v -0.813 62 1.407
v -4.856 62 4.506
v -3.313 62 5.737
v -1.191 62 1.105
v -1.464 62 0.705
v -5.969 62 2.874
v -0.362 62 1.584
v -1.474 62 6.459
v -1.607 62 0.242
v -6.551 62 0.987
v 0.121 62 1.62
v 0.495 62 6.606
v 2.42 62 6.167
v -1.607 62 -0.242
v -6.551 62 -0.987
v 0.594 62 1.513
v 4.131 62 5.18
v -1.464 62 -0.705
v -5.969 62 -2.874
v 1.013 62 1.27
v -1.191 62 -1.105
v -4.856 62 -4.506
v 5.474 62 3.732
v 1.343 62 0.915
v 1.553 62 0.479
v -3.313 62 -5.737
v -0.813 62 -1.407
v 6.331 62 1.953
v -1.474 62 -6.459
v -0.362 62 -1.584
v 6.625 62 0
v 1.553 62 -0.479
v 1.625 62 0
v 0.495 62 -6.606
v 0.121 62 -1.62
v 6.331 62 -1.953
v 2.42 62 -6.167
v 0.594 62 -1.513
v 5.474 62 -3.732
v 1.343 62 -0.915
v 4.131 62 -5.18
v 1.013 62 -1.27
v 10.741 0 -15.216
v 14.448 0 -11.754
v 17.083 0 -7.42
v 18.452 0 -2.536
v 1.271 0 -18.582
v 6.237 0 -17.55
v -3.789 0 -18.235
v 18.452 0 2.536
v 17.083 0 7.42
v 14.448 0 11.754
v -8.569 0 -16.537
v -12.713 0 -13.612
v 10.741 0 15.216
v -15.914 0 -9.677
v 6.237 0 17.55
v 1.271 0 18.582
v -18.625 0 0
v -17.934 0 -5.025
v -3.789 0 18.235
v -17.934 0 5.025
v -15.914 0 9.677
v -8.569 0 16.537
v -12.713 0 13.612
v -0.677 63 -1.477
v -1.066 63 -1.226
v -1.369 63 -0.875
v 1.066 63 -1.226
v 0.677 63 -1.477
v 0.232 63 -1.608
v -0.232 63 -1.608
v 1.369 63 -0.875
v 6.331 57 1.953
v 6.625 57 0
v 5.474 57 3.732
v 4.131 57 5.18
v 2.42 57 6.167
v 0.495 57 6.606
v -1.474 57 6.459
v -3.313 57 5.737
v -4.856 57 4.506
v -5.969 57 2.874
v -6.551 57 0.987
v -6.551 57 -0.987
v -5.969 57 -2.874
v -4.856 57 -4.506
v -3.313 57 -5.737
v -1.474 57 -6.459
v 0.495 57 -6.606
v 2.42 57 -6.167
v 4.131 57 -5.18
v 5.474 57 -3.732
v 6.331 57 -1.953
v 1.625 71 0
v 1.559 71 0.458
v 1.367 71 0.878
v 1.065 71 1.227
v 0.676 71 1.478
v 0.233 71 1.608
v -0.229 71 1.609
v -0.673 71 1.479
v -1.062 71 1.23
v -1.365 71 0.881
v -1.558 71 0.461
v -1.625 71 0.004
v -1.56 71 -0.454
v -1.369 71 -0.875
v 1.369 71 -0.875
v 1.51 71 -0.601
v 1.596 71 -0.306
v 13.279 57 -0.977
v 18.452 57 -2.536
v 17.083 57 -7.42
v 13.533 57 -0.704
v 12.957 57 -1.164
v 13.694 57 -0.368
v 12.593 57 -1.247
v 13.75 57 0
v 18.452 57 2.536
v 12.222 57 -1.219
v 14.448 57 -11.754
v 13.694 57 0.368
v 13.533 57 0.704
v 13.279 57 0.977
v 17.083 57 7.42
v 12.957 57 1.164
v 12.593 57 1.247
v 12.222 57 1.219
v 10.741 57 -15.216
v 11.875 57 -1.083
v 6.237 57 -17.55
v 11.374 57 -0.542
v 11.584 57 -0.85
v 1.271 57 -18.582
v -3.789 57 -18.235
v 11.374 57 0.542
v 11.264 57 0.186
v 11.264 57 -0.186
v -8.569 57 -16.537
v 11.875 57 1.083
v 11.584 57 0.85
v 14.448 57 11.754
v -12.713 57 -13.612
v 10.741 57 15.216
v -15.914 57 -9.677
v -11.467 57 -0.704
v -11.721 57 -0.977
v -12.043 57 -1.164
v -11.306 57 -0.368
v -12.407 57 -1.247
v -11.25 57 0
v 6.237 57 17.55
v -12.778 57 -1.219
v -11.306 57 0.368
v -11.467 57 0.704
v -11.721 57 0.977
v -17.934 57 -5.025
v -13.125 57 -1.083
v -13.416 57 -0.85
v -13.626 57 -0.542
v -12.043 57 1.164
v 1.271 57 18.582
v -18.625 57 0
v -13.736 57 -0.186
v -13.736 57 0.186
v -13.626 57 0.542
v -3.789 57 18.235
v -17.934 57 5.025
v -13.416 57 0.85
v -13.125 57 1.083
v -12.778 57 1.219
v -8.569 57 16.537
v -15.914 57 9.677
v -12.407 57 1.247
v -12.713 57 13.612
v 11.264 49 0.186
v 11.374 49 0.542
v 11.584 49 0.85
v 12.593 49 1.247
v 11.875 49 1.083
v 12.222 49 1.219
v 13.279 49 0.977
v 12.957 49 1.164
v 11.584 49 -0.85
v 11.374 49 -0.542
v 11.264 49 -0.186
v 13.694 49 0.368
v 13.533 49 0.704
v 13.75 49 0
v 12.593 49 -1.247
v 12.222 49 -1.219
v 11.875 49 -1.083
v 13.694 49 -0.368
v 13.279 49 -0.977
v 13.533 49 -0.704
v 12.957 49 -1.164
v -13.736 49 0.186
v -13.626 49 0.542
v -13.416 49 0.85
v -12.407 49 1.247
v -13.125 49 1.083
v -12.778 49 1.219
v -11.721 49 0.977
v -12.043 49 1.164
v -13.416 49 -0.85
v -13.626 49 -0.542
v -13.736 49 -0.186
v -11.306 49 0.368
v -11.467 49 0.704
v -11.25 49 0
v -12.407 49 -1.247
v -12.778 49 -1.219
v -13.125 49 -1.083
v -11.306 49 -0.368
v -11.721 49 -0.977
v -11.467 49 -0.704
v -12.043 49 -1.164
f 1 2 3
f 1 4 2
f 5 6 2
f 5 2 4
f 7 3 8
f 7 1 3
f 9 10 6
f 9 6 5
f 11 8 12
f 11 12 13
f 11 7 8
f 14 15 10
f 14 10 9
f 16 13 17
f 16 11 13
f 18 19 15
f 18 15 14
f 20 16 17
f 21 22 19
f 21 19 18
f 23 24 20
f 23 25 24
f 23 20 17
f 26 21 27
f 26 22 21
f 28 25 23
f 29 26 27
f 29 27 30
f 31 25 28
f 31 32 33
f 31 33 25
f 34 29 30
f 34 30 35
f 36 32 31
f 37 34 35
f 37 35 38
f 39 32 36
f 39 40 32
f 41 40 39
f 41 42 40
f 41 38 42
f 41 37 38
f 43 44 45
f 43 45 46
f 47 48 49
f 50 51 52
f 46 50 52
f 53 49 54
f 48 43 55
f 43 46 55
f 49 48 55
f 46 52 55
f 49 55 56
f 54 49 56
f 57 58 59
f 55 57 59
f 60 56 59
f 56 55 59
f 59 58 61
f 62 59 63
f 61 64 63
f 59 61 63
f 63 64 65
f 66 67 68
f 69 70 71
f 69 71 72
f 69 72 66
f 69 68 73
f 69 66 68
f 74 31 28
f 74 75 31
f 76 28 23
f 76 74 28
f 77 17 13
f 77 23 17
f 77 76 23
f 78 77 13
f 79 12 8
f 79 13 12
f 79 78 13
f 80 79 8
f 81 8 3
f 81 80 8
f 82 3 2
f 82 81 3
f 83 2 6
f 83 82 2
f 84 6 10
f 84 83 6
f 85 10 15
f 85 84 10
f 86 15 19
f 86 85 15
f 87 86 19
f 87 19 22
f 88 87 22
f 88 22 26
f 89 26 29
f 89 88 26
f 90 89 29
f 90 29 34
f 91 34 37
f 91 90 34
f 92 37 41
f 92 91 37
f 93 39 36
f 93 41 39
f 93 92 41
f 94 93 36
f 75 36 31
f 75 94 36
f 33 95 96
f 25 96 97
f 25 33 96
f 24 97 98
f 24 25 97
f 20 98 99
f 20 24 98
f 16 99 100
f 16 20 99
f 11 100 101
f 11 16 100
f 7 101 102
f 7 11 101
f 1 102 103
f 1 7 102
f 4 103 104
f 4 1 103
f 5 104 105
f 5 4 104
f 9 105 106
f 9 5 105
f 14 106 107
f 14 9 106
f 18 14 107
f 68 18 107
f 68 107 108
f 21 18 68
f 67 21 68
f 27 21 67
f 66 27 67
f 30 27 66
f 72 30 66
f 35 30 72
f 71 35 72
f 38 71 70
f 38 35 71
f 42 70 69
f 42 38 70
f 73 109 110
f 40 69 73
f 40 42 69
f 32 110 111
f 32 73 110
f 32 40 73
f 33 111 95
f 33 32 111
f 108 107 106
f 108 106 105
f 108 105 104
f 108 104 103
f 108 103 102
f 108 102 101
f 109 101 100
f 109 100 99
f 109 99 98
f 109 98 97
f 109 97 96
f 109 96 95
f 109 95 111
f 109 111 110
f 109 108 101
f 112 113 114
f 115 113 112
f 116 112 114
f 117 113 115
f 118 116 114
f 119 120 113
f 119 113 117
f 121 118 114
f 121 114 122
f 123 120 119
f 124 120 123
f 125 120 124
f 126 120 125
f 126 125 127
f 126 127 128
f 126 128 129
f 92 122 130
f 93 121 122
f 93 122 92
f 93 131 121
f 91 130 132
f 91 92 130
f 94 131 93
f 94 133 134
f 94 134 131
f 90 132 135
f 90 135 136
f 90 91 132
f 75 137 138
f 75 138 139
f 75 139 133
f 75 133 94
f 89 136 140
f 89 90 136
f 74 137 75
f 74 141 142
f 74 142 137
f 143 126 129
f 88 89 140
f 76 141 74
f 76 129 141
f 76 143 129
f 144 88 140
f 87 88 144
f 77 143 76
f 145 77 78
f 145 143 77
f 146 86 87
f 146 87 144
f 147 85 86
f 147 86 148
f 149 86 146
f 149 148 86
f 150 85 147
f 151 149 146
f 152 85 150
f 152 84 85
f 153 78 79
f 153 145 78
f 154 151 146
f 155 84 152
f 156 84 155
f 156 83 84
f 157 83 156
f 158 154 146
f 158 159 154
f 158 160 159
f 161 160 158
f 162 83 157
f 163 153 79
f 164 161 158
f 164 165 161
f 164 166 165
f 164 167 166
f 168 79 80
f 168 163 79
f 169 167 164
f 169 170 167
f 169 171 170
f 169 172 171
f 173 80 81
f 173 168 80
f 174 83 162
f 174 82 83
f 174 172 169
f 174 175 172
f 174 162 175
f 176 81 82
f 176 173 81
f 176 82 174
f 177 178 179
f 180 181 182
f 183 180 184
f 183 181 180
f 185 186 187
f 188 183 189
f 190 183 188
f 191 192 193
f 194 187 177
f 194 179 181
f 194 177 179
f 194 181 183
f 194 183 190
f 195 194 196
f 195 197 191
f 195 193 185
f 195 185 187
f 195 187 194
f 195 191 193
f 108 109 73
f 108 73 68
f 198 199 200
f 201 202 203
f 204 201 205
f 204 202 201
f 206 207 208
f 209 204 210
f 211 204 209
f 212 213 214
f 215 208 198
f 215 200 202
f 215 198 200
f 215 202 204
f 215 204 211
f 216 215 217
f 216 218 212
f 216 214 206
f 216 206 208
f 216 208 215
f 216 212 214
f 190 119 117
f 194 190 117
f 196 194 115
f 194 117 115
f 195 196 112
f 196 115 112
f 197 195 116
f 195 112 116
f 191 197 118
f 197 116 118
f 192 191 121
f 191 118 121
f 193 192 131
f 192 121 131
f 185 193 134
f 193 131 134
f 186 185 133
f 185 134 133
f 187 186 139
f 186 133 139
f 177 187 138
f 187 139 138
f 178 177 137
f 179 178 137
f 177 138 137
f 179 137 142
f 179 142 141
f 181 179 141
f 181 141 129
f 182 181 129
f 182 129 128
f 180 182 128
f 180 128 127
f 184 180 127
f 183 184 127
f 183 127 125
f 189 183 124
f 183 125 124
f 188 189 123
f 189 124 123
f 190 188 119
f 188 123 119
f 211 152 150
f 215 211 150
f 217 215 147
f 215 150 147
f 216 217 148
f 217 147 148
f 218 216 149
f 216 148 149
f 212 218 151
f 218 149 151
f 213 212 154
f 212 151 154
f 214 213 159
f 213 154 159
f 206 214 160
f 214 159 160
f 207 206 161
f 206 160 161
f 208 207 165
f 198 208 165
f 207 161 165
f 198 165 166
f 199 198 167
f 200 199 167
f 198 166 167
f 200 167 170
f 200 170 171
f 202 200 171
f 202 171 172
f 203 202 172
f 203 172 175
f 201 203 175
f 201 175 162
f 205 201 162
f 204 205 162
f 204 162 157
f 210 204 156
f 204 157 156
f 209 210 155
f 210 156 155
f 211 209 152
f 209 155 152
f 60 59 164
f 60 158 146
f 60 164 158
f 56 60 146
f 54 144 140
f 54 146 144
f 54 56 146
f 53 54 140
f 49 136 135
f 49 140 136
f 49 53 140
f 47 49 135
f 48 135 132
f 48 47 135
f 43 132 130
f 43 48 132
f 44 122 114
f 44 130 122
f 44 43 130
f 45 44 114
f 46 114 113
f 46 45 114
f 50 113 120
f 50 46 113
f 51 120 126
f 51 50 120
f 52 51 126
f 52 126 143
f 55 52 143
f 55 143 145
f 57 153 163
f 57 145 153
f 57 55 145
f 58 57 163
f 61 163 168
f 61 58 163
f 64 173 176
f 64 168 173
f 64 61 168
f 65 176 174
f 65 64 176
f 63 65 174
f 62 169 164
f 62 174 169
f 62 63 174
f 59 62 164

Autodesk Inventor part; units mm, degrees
ref_plane "YZ Plane" through (0, 0, 0) normal (1, 0, 0) x (0, 1, 0)
ref_plane "XZ Plane" through (0, 0, 0) normal (0, 1, 0) x (-1, 0, 0)
ref_plane "XY Plane" through (0, 0, 0) normal (0, 0, 1) x (1, 0, 0)
sketch "Sketch1" plane through (0, 0, 0) normal (0, 1, 0) x (-1, 0, 0)
  circle A0 centre (0, 0) radius 18.625
  dimension "d0" = 37.25
extrude "Extrusion1" add sketch "Sketch1" along normal blind 57
sketch "Sketch2" plane through (0, 57, 0) normal (0, 1, 0) x (1, 0, 0)
  circle A0 centre (0, 0) radius 6.625
  dimension "d3" = 13.25
extrude "Extrusion2" add sketch "Sketch2" along normal blind 5
sketch "Sketch3" plane through (0, 62, 0) normal (0, 1, 0) x (1, 0, 0)
  circle A0 centre (0, 0) radius 1.625
  dimension "d6" = 3.25
extrude "Extrusion3" add sketch "Sketch3" along normal blind 9
sketch "Sketch4" plane through (0, 71, 0) normal (0, 1, 0) x (1, 0, 0)
  circle A0 centre (0, 0) radius 1.625 projected
  line L0 (0, 0.875) -> (-1.3693, 0.875)
  line L1 (0, 0.875) -> (1.3693, 0.875)
  arc A1 (1.3693, 0.875) -> (-1.3693, 0.875) centre (0, 0) ccw
extrude "Extrusion4" cut sketch "Sketch4" against normal blind 8 contours L1 L0 A0 picked at (0.8372, 0.9686)
sketch "Sketch5" plane through (0, 57, 0) normal (0, 1, 0) x (1, 0, 0)
  circle A0 centre (12.5, 0) radius 1.25
  circle A1 centre (-12.5, 0) radius 1.25
  line L0 (-12.5, 0) -> (0, 0)
  line L1 (0, 0) -> (12.5, 0)
  dimension "d13" = 2.5
  dimension "d14" = 2.5
  dimension "d17" = 12.5
  dimension "d18" = 12.5
extrude "Extrusion5" cut sketch "Sketch5" against normal blind 8
properties part number "Helion_Motor"
